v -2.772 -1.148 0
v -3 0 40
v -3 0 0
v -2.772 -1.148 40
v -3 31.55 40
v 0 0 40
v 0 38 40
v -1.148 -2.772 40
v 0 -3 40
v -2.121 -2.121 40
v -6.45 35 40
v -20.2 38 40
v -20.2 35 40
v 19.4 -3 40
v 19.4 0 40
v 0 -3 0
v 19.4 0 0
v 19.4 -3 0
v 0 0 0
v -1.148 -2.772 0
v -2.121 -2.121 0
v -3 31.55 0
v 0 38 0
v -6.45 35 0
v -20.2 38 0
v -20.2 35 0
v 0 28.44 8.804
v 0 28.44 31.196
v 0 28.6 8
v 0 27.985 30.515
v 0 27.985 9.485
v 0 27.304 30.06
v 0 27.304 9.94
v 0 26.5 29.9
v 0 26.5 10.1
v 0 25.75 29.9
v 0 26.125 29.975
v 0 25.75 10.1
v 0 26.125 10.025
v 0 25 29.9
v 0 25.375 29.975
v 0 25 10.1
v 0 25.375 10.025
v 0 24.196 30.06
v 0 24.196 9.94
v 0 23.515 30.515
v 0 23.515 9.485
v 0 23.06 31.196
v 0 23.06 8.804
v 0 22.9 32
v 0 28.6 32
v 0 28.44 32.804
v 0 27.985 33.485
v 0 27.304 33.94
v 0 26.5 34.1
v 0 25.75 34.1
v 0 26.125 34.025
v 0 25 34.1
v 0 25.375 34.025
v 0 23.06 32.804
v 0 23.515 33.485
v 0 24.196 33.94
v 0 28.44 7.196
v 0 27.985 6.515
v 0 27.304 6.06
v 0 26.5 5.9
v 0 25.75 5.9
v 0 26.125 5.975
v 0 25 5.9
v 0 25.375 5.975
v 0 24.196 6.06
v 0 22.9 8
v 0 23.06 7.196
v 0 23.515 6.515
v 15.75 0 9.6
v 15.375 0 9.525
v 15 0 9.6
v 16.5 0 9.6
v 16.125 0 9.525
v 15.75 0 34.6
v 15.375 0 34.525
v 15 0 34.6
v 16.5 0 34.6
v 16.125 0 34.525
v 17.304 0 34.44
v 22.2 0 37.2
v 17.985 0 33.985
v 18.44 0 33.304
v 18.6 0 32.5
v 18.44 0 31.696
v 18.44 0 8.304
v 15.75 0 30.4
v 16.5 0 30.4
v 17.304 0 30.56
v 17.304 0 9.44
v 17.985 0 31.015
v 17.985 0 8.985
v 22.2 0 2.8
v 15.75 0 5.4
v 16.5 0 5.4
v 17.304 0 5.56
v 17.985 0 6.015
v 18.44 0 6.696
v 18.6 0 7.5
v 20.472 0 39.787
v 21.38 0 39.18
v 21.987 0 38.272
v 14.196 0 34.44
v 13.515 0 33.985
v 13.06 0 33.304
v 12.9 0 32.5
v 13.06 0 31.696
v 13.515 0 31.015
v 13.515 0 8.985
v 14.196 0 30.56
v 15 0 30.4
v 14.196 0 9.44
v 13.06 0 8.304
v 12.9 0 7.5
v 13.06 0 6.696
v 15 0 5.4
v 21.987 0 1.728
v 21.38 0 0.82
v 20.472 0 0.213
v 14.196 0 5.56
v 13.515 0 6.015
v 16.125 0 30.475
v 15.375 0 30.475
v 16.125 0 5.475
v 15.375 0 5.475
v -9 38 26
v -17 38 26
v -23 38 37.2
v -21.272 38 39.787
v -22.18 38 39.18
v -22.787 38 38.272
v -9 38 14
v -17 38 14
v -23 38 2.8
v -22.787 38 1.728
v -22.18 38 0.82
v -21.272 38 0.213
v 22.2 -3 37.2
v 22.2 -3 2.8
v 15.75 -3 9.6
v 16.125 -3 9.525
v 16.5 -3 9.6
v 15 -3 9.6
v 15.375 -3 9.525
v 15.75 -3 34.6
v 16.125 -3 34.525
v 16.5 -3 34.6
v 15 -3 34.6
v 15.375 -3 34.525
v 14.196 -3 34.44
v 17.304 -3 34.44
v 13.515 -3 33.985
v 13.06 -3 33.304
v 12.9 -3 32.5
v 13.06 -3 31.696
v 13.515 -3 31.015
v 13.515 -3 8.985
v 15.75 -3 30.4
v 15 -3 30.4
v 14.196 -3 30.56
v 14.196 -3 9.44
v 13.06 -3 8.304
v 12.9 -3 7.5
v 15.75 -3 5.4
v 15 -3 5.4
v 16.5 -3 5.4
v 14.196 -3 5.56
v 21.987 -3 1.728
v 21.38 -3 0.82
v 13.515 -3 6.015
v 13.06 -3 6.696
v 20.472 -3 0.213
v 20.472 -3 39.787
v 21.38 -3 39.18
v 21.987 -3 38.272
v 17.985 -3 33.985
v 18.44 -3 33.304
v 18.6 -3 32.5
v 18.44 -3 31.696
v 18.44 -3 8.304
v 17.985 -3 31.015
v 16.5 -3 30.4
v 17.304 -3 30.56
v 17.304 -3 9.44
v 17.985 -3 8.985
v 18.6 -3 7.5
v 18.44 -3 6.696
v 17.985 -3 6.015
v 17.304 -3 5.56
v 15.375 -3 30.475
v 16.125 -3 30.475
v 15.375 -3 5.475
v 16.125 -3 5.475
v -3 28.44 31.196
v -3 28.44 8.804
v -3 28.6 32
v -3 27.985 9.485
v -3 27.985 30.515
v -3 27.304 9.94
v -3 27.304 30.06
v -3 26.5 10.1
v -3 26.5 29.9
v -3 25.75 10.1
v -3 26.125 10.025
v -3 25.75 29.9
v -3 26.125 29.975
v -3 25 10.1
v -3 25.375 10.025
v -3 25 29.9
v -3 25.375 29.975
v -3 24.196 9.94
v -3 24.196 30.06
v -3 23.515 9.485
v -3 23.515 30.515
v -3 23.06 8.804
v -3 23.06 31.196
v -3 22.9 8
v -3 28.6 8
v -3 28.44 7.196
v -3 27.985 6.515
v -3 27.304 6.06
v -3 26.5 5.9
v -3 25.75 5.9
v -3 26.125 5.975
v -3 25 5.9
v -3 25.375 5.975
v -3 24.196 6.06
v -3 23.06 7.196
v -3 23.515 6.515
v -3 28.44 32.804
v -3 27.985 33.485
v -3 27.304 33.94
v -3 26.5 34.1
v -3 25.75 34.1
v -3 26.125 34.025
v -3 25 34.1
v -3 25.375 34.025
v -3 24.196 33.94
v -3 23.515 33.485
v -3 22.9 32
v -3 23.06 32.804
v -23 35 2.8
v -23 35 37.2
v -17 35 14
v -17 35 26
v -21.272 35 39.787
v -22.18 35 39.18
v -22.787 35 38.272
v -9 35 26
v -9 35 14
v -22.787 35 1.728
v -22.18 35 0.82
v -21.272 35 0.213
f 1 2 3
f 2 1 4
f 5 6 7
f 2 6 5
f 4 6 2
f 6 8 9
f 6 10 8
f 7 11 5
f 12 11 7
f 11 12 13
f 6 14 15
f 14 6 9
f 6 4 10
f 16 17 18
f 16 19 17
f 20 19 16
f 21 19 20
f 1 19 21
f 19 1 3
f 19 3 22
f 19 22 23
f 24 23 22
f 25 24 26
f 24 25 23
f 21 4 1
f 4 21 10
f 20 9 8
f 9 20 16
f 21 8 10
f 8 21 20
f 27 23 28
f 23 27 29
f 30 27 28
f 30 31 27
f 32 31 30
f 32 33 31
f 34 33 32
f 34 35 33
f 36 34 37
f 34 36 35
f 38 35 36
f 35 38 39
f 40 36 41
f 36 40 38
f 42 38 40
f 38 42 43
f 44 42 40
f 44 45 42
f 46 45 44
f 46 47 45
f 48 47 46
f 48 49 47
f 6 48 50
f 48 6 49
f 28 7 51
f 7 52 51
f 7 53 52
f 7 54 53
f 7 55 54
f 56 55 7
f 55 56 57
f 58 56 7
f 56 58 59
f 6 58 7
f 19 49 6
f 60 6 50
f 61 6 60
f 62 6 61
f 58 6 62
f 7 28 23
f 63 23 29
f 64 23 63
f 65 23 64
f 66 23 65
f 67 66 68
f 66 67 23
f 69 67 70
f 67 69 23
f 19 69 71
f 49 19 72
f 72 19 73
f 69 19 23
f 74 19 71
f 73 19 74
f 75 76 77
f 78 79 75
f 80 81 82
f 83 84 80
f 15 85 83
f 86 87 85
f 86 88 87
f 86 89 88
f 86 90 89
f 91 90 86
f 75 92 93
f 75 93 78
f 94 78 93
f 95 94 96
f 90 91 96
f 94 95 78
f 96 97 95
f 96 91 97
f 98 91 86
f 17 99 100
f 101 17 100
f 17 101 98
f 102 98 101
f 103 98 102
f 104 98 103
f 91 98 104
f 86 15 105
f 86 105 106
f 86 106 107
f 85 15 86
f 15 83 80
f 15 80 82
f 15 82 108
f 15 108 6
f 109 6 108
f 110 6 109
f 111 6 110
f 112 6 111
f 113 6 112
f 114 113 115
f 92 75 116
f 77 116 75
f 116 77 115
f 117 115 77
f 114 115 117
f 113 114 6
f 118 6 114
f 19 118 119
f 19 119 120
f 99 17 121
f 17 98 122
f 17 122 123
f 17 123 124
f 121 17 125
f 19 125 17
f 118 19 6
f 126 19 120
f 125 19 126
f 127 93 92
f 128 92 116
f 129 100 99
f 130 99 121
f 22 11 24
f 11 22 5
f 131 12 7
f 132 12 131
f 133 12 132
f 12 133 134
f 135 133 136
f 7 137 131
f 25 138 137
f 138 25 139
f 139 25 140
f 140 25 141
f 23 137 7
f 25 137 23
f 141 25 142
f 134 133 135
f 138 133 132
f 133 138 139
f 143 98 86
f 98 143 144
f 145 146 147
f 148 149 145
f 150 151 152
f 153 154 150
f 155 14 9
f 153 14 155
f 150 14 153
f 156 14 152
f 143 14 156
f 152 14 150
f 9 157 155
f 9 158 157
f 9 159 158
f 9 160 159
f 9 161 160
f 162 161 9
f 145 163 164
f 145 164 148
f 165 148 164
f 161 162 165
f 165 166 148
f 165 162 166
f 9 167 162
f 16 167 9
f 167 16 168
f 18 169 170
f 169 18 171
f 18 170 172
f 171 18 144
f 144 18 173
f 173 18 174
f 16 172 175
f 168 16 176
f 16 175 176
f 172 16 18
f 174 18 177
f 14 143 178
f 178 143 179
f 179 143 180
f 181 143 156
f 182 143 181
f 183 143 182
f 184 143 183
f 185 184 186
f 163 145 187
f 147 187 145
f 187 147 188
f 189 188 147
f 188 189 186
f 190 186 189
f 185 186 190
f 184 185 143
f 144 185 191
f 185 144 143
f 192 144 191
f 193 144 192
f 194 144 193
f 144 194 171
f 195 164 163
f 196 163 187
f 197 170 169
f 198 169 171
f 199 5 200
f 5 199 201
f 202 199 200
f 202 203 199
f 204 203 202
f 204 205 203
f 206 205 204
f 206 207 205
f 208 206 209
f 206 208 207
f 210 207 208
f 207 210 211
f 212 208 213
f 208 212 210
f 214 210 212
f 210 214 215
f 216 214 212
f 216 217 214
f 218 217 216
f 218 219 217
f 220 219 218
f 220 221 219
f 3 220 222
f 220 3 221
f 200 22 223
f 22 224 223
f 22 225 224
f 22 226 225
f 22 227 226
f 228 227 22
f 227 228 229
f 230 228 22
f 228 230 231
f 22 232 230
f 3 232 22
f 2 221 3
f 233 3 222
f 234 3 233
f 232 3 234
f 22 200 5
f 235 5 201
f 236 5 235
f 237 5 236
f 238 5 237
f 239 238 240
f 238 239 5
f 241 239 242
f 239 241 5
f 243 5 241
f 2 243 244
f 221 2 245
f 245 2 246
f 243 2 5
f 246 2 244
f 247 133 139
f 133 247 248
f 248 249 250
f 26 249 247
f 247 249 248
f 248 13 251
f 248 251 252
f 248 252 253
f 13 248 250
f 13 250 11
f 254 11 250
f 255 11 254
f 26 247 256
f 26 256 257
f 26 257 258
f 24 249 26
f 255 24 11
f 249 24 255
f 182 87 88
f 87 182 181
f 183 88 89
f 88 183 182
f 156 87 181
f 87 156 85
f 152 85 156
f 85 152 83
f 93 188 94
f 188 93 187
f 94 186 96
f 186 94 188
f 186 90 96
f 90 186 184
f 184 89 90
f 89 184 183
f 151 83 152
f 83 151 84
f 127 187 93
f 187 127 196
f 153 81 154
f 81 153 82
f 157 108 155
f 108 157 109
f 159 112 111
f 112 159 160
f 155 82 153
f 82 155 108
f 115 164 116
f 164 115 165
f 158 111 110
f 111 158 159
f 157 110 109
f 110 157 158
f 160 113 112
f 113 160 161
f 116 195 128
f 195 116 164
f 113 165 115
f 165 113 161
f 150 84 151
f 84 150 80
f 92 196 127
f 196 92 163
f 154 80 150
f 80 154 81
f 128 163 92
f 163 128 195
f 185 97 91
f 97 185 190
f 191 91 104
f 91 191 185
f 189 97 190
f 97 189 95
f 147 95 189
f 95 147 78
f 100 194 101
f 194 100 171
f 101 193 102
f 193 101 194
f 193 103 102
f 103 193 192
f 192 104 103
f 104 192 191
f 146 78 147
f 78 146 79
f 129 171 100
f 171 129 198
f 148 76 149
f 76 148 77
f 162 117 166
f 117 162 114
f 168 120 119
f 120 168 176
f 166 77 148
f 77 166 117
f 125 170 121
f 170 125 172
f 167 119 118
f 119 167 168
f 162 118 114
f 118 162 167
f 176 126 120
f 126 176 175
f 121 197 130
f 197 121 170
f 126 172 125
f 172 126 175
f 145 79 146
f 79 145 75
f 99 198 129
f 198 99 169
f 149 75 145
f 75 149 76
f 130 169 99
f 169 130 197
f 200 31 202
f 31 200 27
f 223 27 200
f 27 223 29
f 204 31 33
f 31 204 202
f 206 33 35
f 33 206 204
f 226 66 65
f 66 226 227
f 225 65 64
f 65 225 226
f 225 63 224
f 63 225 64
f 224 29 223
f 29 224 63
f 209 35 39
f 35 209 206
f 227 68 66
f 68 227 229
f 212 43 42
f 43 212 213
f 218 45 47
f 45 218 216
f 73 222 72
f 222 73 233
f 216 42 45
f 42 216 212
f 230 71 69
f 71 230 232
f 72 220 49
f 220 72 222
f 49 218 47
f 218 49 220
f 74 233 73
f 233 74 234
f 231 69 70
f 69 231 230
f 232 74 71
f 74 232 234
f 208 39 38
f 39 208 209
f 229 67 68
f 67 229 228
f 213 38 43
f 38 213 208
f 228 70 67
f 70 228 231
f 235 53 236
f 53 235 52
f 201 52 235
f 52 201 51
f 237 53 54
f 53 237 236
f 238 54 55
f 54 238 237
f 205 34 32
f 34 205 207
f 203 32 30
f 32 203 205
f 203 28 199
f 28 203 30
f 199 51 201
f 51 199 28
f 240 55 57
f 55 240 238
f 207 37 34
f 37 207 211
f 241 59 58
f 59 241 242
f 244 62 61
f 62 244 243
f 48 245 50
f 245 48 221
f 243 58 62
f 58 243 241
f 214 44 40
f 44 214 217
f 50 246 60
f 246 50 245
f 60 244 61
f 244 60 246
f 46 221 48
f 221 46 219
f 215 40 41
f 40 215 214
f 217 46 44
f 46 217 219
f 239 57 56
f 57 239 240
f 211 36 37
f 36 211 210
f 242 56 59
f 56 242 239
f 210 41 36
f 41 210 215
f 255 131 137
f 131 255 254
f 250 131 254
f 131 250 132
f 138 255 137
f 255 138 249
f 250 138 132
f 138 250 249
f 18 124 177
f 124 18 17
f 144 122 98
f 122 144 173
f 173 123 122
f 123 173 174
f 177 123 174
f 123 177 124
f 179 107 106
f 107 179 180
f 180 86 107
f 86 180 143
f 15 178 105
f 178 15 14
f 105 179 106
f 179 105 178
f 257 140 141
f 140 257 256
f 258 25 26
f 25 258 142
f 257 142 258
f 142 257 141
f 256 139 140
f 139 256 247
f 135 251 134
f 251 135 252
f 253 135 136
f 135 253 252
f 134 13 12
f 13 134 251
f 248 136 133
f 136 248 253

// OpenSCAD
//CUSTOMIZER VARIABLES

// Position
CornerChoice = 0;    // [0:Both, 1:FrontLeft/BackRight, 2:FrontRight/BackLeft]

// Tool
ToolChoice = 1;     // [0:Custom, 1:SafetyGlasses, 2:NutDriver, 3:PuttyKnife, 4:Tweezers, 5:FlushCutters, 6:SonicScrewdriver]

// minimum width of holder, in mm 
minimum_width = 40;   // [40:300]

// thickness of holder, in mm 
thickness = 3.0;    // [2:0.1:10]

// margin around tool hole, in mm 
tool_margin = 4;    // [2:50]

// Custom height of holder, in mm
custom_total_height = 40;  // [40:100]

// Custom length of tool space, in mm
custom_tool_length = 20.0;   // [10:50]

//  Custom width of tool hole, in mm
custom_tool_hole_width = 12;   // [10:200]

//  Custom length of tool hole, in mm 
custom_tool_hole_length = 8;   // [10:200]

// screw hole diameter, in mm 
screw_diameter = 3.7;   // [2:0.1:10]

// screw margin, in mm 
screw_margin = 2.0; // [1:0.1:10]

// corner radius, in mm (can be zero)
corner_radius = 2.8;    // [0:10]

//CUSTOMIZER VARIABLES END


// Force Customizer to really stop now
five = 2 + 2;  // ...for sufficiently large values of 2

if (five != 4) {
    echo("<B>Error: Customizer is more screwd up than usual.</B>");
}

// Constants

// [ holder_height, tool_length, hole_width, hole_length, name ]
tool_templates = [
    [ custom_total_height, custom_tool_length, custom_tool_hole_width, custom_tool_hole_length , "Custom"  ],
    [ 35.0, 20.0, 12.0,  8.0, "SafetyGlasses" ],
    [ 40.0, 24.0, 13.0, 13.0, "NutDriver" ],
    [ 40.0, 28.0, 55.0,  7.0, "PuttyKnife" ],
    [ 35.0, 13.0,  5.0,  5.0, "Tweezers" ],
    [ 35.0, 20.0, 26.0,  8.5, "FlushCutters" ],
    [ 50.0, 32.0, 22.0, 22.0, "SonicScrewdriver" ],     // Do Not Lick
];


total_height = tool_templates[ToolChoice][0];
temp_tool_length = tool_templates[ToolChoice][1];
tool_hole_width = tool_templates[ToolChoice][2];
tool_hole_length = tool_templates[ToolChoice][3];

// top hole offset from side
top_offset_side = 16.5;
top_offset_side2 = 15.0;    // alllow for some variation in position

// top hole offset from end
top_offset_end = 30.4;

// side hole offset from end
side_offset_end = 5.9;

// side hole offset from top
side_offset_top = 26.5;
side_offset_top2 = 24.5;    // alllow for some variation in position


real_width = max( minimum_width, tool_hole_width+2*tool_margin, top_offset_end + screw_diameter + 2*screw_margin );
tool_length = max( temp_tool_length, tool_hole_length + 2*tool_margin );

// Sanity checks
if ( (side_offset_top + screw_diameter + 2*screw_margin) > total_height)
{
    echo("<B>Error: height too small</B>");
}



// our object, flat on xy plane for easy STL generation
tool_holder();

module tool_holder() {
    
    screw_radius = (screw_diameter + 0.5) / 2;
    
    temp_top_z = top_offset_end + screw_radius;
    temp_side_z = side_offset_end + screw_radius;
    
    top_length = top_offset_side + screw_diameter + screw_margin;
    
    tool_hole_z = real_width/2;
    tool_hole_x = -tool_length/2 - thickness;
    
    difference() {
        
        union () {
            
            // main body top
            translate( [0,-thickness,0] )
                cube([top_length,thickness,real_width] );
            
            // main body side
            translate( [-thickness,0,0] )
                cube([thickness,total_height,real_width] );
            
            // tool ledge
            translate( [-tool_length-thickness,total_height,0] )
                cube([tool_length+thickness,thickness,real_width] );
            
            // round top/side corner
            difference() {
              translate( [0,0,real_width/2] )
                cylinder(real_width,thickness,thickness, center=true, $fn=16 );
                
              translate( [0,0,-2] )
                cube([thickness*2,thickness*2,real_width+4] );
            }
           
            // fillet edge to tool holder
            // TODO - should I add extra length for this?
            difference() {
              translate( [-0.85*thickness,total_height-1.3*thickness,0] )
                rotate([0,0,45])
                  cube([thickness*2,thickness*2,real_width]);
            
              translate( [0,total_height-thickness,-2] )
               cube([thickness*2,thickness*2,real_width+4]);
            
              translate( [-thickness*2,total_height+thickness,-2] )
                cube([thickness*2,thickness*2,real_width+4]);
            }
            
        }   // end union
    
      // top screw hole, elongated to allow for variations
      if (CornerChoice == 0 || CornerChoice == 1) {
          top_hole_z = temp_top_z;
          translate( [top_offset_side,-thickness/2,top_hole_z] )
            rotate([90,0,0])
              bolt_hole(thickness+4,screw_radius,(top_offset_side2-top_offset_side));
      }
      if (CornerChoice == 0 || CornerChoice == 2) {
          top_hole_z = real_width - temp_top_z;
          translate( [top_offset_side,-thickness/2,top_hole_z] )
            rotate([90,0,0])
              bolt_hole(thickness+4,screw_radius,(top_offset_side2-top_offset_side));
      }
      // side screw hole, elongated to allow for variations
      if (CornerChoice == 0 || CornerChoice == 1) {
          side_hole_z = temp_side_z;
          translate( [2-tool_length/2-thickness/2,side_offset_top,side_hole_z] )
            rotate([90,0,90])
              bolt_hole(tool_length+thickness+4,screw_radius,(top_offset_side2-top_offset_side));
      }
      if (CornerChoice == 0 || CornerChoice == 2) {
          side_hole_z = real_width - temp_side_z;
          translate( [2-tool_length/2-thickness/2,side_offset_top,side_hole_z] )
            rotate([90,0,90])
              bolt_hole(tool_length+thickness+4,screw_radius,(top_offset_side2-top_offset_side));
      }

      // tool hole
      translate( [tool_hole_x-tool_hole_length/2,2,tool_hole_z-tool_hole_width/2] )
        cube([tool_hole_length,total_height+thickness+4,tool_hole_width] );

      // optionally round corners of tool holder and top
      if (corner_radius > 0.0) {
        translate( [top_length-corner_radius,-thickness-2,0] )
          cube([corner_radius,thickness+4,corner_radius]);
        translate( [top_length-corner_radius,-thickness-2,real_width-corner_radius] )
          cube([corner_radius,thickness+4,corner_radius]);
        translate( [-tool_length-thickness,total_height-2,0] )
          cube([corner_radius,thickness+4,corner_radius]);
        translate( [-tool_length-thickness,total_height-2,real_width-corner_radius] )
          cube([corner_radius,thickness+4,corner_radius]);
      }
        
    }   // end difference
            
    // optionally round corners of tool holder and top
    if (corner_radius > 0.0) {
// TODO - This can cover part of the screw hole if corner_radius is much more than screw_margin
        translate( [top_length-corner_radius,0,corner_radius] )
          rotate([90,0,0])
            cylinder(thickness,corner_radius,corner_radius, $fn=16);
        translate( [top_length-corner_radius,0,real_width-corner_radius] )
          rotate([90,0,0])
            cylinder(thickness,corner_radius,corner_radius, $fn=16);
        translate( [-tool_length-thickness+corner_radius,total_height+thickness,corner_radius] )
          rotate([90,0,0])
            cylinder(thickness,corner_radius,corner_radius, $fn=16);
        translate( [-tool_length-thickness+corner_radius,total_height+thickness,real_width-corner_radius] )
          rotate([90,0,0])
            cylinder(thickness,corner_radius,corner_radius, $fn=16);
                  
    }
    
}   // end tool_holder


module bolt_hole(length,radius,offset) {
    cylinder(length,radius,radius, center=true, $fn=16 );
  translate( [offset,0,0] )
    cylinder(length,radius,radius, center=true, $fn=16 );
  translate( [offset/2,0,0] )
    cylinder(length,radius,radius, center=true, $fn=16 );
}
